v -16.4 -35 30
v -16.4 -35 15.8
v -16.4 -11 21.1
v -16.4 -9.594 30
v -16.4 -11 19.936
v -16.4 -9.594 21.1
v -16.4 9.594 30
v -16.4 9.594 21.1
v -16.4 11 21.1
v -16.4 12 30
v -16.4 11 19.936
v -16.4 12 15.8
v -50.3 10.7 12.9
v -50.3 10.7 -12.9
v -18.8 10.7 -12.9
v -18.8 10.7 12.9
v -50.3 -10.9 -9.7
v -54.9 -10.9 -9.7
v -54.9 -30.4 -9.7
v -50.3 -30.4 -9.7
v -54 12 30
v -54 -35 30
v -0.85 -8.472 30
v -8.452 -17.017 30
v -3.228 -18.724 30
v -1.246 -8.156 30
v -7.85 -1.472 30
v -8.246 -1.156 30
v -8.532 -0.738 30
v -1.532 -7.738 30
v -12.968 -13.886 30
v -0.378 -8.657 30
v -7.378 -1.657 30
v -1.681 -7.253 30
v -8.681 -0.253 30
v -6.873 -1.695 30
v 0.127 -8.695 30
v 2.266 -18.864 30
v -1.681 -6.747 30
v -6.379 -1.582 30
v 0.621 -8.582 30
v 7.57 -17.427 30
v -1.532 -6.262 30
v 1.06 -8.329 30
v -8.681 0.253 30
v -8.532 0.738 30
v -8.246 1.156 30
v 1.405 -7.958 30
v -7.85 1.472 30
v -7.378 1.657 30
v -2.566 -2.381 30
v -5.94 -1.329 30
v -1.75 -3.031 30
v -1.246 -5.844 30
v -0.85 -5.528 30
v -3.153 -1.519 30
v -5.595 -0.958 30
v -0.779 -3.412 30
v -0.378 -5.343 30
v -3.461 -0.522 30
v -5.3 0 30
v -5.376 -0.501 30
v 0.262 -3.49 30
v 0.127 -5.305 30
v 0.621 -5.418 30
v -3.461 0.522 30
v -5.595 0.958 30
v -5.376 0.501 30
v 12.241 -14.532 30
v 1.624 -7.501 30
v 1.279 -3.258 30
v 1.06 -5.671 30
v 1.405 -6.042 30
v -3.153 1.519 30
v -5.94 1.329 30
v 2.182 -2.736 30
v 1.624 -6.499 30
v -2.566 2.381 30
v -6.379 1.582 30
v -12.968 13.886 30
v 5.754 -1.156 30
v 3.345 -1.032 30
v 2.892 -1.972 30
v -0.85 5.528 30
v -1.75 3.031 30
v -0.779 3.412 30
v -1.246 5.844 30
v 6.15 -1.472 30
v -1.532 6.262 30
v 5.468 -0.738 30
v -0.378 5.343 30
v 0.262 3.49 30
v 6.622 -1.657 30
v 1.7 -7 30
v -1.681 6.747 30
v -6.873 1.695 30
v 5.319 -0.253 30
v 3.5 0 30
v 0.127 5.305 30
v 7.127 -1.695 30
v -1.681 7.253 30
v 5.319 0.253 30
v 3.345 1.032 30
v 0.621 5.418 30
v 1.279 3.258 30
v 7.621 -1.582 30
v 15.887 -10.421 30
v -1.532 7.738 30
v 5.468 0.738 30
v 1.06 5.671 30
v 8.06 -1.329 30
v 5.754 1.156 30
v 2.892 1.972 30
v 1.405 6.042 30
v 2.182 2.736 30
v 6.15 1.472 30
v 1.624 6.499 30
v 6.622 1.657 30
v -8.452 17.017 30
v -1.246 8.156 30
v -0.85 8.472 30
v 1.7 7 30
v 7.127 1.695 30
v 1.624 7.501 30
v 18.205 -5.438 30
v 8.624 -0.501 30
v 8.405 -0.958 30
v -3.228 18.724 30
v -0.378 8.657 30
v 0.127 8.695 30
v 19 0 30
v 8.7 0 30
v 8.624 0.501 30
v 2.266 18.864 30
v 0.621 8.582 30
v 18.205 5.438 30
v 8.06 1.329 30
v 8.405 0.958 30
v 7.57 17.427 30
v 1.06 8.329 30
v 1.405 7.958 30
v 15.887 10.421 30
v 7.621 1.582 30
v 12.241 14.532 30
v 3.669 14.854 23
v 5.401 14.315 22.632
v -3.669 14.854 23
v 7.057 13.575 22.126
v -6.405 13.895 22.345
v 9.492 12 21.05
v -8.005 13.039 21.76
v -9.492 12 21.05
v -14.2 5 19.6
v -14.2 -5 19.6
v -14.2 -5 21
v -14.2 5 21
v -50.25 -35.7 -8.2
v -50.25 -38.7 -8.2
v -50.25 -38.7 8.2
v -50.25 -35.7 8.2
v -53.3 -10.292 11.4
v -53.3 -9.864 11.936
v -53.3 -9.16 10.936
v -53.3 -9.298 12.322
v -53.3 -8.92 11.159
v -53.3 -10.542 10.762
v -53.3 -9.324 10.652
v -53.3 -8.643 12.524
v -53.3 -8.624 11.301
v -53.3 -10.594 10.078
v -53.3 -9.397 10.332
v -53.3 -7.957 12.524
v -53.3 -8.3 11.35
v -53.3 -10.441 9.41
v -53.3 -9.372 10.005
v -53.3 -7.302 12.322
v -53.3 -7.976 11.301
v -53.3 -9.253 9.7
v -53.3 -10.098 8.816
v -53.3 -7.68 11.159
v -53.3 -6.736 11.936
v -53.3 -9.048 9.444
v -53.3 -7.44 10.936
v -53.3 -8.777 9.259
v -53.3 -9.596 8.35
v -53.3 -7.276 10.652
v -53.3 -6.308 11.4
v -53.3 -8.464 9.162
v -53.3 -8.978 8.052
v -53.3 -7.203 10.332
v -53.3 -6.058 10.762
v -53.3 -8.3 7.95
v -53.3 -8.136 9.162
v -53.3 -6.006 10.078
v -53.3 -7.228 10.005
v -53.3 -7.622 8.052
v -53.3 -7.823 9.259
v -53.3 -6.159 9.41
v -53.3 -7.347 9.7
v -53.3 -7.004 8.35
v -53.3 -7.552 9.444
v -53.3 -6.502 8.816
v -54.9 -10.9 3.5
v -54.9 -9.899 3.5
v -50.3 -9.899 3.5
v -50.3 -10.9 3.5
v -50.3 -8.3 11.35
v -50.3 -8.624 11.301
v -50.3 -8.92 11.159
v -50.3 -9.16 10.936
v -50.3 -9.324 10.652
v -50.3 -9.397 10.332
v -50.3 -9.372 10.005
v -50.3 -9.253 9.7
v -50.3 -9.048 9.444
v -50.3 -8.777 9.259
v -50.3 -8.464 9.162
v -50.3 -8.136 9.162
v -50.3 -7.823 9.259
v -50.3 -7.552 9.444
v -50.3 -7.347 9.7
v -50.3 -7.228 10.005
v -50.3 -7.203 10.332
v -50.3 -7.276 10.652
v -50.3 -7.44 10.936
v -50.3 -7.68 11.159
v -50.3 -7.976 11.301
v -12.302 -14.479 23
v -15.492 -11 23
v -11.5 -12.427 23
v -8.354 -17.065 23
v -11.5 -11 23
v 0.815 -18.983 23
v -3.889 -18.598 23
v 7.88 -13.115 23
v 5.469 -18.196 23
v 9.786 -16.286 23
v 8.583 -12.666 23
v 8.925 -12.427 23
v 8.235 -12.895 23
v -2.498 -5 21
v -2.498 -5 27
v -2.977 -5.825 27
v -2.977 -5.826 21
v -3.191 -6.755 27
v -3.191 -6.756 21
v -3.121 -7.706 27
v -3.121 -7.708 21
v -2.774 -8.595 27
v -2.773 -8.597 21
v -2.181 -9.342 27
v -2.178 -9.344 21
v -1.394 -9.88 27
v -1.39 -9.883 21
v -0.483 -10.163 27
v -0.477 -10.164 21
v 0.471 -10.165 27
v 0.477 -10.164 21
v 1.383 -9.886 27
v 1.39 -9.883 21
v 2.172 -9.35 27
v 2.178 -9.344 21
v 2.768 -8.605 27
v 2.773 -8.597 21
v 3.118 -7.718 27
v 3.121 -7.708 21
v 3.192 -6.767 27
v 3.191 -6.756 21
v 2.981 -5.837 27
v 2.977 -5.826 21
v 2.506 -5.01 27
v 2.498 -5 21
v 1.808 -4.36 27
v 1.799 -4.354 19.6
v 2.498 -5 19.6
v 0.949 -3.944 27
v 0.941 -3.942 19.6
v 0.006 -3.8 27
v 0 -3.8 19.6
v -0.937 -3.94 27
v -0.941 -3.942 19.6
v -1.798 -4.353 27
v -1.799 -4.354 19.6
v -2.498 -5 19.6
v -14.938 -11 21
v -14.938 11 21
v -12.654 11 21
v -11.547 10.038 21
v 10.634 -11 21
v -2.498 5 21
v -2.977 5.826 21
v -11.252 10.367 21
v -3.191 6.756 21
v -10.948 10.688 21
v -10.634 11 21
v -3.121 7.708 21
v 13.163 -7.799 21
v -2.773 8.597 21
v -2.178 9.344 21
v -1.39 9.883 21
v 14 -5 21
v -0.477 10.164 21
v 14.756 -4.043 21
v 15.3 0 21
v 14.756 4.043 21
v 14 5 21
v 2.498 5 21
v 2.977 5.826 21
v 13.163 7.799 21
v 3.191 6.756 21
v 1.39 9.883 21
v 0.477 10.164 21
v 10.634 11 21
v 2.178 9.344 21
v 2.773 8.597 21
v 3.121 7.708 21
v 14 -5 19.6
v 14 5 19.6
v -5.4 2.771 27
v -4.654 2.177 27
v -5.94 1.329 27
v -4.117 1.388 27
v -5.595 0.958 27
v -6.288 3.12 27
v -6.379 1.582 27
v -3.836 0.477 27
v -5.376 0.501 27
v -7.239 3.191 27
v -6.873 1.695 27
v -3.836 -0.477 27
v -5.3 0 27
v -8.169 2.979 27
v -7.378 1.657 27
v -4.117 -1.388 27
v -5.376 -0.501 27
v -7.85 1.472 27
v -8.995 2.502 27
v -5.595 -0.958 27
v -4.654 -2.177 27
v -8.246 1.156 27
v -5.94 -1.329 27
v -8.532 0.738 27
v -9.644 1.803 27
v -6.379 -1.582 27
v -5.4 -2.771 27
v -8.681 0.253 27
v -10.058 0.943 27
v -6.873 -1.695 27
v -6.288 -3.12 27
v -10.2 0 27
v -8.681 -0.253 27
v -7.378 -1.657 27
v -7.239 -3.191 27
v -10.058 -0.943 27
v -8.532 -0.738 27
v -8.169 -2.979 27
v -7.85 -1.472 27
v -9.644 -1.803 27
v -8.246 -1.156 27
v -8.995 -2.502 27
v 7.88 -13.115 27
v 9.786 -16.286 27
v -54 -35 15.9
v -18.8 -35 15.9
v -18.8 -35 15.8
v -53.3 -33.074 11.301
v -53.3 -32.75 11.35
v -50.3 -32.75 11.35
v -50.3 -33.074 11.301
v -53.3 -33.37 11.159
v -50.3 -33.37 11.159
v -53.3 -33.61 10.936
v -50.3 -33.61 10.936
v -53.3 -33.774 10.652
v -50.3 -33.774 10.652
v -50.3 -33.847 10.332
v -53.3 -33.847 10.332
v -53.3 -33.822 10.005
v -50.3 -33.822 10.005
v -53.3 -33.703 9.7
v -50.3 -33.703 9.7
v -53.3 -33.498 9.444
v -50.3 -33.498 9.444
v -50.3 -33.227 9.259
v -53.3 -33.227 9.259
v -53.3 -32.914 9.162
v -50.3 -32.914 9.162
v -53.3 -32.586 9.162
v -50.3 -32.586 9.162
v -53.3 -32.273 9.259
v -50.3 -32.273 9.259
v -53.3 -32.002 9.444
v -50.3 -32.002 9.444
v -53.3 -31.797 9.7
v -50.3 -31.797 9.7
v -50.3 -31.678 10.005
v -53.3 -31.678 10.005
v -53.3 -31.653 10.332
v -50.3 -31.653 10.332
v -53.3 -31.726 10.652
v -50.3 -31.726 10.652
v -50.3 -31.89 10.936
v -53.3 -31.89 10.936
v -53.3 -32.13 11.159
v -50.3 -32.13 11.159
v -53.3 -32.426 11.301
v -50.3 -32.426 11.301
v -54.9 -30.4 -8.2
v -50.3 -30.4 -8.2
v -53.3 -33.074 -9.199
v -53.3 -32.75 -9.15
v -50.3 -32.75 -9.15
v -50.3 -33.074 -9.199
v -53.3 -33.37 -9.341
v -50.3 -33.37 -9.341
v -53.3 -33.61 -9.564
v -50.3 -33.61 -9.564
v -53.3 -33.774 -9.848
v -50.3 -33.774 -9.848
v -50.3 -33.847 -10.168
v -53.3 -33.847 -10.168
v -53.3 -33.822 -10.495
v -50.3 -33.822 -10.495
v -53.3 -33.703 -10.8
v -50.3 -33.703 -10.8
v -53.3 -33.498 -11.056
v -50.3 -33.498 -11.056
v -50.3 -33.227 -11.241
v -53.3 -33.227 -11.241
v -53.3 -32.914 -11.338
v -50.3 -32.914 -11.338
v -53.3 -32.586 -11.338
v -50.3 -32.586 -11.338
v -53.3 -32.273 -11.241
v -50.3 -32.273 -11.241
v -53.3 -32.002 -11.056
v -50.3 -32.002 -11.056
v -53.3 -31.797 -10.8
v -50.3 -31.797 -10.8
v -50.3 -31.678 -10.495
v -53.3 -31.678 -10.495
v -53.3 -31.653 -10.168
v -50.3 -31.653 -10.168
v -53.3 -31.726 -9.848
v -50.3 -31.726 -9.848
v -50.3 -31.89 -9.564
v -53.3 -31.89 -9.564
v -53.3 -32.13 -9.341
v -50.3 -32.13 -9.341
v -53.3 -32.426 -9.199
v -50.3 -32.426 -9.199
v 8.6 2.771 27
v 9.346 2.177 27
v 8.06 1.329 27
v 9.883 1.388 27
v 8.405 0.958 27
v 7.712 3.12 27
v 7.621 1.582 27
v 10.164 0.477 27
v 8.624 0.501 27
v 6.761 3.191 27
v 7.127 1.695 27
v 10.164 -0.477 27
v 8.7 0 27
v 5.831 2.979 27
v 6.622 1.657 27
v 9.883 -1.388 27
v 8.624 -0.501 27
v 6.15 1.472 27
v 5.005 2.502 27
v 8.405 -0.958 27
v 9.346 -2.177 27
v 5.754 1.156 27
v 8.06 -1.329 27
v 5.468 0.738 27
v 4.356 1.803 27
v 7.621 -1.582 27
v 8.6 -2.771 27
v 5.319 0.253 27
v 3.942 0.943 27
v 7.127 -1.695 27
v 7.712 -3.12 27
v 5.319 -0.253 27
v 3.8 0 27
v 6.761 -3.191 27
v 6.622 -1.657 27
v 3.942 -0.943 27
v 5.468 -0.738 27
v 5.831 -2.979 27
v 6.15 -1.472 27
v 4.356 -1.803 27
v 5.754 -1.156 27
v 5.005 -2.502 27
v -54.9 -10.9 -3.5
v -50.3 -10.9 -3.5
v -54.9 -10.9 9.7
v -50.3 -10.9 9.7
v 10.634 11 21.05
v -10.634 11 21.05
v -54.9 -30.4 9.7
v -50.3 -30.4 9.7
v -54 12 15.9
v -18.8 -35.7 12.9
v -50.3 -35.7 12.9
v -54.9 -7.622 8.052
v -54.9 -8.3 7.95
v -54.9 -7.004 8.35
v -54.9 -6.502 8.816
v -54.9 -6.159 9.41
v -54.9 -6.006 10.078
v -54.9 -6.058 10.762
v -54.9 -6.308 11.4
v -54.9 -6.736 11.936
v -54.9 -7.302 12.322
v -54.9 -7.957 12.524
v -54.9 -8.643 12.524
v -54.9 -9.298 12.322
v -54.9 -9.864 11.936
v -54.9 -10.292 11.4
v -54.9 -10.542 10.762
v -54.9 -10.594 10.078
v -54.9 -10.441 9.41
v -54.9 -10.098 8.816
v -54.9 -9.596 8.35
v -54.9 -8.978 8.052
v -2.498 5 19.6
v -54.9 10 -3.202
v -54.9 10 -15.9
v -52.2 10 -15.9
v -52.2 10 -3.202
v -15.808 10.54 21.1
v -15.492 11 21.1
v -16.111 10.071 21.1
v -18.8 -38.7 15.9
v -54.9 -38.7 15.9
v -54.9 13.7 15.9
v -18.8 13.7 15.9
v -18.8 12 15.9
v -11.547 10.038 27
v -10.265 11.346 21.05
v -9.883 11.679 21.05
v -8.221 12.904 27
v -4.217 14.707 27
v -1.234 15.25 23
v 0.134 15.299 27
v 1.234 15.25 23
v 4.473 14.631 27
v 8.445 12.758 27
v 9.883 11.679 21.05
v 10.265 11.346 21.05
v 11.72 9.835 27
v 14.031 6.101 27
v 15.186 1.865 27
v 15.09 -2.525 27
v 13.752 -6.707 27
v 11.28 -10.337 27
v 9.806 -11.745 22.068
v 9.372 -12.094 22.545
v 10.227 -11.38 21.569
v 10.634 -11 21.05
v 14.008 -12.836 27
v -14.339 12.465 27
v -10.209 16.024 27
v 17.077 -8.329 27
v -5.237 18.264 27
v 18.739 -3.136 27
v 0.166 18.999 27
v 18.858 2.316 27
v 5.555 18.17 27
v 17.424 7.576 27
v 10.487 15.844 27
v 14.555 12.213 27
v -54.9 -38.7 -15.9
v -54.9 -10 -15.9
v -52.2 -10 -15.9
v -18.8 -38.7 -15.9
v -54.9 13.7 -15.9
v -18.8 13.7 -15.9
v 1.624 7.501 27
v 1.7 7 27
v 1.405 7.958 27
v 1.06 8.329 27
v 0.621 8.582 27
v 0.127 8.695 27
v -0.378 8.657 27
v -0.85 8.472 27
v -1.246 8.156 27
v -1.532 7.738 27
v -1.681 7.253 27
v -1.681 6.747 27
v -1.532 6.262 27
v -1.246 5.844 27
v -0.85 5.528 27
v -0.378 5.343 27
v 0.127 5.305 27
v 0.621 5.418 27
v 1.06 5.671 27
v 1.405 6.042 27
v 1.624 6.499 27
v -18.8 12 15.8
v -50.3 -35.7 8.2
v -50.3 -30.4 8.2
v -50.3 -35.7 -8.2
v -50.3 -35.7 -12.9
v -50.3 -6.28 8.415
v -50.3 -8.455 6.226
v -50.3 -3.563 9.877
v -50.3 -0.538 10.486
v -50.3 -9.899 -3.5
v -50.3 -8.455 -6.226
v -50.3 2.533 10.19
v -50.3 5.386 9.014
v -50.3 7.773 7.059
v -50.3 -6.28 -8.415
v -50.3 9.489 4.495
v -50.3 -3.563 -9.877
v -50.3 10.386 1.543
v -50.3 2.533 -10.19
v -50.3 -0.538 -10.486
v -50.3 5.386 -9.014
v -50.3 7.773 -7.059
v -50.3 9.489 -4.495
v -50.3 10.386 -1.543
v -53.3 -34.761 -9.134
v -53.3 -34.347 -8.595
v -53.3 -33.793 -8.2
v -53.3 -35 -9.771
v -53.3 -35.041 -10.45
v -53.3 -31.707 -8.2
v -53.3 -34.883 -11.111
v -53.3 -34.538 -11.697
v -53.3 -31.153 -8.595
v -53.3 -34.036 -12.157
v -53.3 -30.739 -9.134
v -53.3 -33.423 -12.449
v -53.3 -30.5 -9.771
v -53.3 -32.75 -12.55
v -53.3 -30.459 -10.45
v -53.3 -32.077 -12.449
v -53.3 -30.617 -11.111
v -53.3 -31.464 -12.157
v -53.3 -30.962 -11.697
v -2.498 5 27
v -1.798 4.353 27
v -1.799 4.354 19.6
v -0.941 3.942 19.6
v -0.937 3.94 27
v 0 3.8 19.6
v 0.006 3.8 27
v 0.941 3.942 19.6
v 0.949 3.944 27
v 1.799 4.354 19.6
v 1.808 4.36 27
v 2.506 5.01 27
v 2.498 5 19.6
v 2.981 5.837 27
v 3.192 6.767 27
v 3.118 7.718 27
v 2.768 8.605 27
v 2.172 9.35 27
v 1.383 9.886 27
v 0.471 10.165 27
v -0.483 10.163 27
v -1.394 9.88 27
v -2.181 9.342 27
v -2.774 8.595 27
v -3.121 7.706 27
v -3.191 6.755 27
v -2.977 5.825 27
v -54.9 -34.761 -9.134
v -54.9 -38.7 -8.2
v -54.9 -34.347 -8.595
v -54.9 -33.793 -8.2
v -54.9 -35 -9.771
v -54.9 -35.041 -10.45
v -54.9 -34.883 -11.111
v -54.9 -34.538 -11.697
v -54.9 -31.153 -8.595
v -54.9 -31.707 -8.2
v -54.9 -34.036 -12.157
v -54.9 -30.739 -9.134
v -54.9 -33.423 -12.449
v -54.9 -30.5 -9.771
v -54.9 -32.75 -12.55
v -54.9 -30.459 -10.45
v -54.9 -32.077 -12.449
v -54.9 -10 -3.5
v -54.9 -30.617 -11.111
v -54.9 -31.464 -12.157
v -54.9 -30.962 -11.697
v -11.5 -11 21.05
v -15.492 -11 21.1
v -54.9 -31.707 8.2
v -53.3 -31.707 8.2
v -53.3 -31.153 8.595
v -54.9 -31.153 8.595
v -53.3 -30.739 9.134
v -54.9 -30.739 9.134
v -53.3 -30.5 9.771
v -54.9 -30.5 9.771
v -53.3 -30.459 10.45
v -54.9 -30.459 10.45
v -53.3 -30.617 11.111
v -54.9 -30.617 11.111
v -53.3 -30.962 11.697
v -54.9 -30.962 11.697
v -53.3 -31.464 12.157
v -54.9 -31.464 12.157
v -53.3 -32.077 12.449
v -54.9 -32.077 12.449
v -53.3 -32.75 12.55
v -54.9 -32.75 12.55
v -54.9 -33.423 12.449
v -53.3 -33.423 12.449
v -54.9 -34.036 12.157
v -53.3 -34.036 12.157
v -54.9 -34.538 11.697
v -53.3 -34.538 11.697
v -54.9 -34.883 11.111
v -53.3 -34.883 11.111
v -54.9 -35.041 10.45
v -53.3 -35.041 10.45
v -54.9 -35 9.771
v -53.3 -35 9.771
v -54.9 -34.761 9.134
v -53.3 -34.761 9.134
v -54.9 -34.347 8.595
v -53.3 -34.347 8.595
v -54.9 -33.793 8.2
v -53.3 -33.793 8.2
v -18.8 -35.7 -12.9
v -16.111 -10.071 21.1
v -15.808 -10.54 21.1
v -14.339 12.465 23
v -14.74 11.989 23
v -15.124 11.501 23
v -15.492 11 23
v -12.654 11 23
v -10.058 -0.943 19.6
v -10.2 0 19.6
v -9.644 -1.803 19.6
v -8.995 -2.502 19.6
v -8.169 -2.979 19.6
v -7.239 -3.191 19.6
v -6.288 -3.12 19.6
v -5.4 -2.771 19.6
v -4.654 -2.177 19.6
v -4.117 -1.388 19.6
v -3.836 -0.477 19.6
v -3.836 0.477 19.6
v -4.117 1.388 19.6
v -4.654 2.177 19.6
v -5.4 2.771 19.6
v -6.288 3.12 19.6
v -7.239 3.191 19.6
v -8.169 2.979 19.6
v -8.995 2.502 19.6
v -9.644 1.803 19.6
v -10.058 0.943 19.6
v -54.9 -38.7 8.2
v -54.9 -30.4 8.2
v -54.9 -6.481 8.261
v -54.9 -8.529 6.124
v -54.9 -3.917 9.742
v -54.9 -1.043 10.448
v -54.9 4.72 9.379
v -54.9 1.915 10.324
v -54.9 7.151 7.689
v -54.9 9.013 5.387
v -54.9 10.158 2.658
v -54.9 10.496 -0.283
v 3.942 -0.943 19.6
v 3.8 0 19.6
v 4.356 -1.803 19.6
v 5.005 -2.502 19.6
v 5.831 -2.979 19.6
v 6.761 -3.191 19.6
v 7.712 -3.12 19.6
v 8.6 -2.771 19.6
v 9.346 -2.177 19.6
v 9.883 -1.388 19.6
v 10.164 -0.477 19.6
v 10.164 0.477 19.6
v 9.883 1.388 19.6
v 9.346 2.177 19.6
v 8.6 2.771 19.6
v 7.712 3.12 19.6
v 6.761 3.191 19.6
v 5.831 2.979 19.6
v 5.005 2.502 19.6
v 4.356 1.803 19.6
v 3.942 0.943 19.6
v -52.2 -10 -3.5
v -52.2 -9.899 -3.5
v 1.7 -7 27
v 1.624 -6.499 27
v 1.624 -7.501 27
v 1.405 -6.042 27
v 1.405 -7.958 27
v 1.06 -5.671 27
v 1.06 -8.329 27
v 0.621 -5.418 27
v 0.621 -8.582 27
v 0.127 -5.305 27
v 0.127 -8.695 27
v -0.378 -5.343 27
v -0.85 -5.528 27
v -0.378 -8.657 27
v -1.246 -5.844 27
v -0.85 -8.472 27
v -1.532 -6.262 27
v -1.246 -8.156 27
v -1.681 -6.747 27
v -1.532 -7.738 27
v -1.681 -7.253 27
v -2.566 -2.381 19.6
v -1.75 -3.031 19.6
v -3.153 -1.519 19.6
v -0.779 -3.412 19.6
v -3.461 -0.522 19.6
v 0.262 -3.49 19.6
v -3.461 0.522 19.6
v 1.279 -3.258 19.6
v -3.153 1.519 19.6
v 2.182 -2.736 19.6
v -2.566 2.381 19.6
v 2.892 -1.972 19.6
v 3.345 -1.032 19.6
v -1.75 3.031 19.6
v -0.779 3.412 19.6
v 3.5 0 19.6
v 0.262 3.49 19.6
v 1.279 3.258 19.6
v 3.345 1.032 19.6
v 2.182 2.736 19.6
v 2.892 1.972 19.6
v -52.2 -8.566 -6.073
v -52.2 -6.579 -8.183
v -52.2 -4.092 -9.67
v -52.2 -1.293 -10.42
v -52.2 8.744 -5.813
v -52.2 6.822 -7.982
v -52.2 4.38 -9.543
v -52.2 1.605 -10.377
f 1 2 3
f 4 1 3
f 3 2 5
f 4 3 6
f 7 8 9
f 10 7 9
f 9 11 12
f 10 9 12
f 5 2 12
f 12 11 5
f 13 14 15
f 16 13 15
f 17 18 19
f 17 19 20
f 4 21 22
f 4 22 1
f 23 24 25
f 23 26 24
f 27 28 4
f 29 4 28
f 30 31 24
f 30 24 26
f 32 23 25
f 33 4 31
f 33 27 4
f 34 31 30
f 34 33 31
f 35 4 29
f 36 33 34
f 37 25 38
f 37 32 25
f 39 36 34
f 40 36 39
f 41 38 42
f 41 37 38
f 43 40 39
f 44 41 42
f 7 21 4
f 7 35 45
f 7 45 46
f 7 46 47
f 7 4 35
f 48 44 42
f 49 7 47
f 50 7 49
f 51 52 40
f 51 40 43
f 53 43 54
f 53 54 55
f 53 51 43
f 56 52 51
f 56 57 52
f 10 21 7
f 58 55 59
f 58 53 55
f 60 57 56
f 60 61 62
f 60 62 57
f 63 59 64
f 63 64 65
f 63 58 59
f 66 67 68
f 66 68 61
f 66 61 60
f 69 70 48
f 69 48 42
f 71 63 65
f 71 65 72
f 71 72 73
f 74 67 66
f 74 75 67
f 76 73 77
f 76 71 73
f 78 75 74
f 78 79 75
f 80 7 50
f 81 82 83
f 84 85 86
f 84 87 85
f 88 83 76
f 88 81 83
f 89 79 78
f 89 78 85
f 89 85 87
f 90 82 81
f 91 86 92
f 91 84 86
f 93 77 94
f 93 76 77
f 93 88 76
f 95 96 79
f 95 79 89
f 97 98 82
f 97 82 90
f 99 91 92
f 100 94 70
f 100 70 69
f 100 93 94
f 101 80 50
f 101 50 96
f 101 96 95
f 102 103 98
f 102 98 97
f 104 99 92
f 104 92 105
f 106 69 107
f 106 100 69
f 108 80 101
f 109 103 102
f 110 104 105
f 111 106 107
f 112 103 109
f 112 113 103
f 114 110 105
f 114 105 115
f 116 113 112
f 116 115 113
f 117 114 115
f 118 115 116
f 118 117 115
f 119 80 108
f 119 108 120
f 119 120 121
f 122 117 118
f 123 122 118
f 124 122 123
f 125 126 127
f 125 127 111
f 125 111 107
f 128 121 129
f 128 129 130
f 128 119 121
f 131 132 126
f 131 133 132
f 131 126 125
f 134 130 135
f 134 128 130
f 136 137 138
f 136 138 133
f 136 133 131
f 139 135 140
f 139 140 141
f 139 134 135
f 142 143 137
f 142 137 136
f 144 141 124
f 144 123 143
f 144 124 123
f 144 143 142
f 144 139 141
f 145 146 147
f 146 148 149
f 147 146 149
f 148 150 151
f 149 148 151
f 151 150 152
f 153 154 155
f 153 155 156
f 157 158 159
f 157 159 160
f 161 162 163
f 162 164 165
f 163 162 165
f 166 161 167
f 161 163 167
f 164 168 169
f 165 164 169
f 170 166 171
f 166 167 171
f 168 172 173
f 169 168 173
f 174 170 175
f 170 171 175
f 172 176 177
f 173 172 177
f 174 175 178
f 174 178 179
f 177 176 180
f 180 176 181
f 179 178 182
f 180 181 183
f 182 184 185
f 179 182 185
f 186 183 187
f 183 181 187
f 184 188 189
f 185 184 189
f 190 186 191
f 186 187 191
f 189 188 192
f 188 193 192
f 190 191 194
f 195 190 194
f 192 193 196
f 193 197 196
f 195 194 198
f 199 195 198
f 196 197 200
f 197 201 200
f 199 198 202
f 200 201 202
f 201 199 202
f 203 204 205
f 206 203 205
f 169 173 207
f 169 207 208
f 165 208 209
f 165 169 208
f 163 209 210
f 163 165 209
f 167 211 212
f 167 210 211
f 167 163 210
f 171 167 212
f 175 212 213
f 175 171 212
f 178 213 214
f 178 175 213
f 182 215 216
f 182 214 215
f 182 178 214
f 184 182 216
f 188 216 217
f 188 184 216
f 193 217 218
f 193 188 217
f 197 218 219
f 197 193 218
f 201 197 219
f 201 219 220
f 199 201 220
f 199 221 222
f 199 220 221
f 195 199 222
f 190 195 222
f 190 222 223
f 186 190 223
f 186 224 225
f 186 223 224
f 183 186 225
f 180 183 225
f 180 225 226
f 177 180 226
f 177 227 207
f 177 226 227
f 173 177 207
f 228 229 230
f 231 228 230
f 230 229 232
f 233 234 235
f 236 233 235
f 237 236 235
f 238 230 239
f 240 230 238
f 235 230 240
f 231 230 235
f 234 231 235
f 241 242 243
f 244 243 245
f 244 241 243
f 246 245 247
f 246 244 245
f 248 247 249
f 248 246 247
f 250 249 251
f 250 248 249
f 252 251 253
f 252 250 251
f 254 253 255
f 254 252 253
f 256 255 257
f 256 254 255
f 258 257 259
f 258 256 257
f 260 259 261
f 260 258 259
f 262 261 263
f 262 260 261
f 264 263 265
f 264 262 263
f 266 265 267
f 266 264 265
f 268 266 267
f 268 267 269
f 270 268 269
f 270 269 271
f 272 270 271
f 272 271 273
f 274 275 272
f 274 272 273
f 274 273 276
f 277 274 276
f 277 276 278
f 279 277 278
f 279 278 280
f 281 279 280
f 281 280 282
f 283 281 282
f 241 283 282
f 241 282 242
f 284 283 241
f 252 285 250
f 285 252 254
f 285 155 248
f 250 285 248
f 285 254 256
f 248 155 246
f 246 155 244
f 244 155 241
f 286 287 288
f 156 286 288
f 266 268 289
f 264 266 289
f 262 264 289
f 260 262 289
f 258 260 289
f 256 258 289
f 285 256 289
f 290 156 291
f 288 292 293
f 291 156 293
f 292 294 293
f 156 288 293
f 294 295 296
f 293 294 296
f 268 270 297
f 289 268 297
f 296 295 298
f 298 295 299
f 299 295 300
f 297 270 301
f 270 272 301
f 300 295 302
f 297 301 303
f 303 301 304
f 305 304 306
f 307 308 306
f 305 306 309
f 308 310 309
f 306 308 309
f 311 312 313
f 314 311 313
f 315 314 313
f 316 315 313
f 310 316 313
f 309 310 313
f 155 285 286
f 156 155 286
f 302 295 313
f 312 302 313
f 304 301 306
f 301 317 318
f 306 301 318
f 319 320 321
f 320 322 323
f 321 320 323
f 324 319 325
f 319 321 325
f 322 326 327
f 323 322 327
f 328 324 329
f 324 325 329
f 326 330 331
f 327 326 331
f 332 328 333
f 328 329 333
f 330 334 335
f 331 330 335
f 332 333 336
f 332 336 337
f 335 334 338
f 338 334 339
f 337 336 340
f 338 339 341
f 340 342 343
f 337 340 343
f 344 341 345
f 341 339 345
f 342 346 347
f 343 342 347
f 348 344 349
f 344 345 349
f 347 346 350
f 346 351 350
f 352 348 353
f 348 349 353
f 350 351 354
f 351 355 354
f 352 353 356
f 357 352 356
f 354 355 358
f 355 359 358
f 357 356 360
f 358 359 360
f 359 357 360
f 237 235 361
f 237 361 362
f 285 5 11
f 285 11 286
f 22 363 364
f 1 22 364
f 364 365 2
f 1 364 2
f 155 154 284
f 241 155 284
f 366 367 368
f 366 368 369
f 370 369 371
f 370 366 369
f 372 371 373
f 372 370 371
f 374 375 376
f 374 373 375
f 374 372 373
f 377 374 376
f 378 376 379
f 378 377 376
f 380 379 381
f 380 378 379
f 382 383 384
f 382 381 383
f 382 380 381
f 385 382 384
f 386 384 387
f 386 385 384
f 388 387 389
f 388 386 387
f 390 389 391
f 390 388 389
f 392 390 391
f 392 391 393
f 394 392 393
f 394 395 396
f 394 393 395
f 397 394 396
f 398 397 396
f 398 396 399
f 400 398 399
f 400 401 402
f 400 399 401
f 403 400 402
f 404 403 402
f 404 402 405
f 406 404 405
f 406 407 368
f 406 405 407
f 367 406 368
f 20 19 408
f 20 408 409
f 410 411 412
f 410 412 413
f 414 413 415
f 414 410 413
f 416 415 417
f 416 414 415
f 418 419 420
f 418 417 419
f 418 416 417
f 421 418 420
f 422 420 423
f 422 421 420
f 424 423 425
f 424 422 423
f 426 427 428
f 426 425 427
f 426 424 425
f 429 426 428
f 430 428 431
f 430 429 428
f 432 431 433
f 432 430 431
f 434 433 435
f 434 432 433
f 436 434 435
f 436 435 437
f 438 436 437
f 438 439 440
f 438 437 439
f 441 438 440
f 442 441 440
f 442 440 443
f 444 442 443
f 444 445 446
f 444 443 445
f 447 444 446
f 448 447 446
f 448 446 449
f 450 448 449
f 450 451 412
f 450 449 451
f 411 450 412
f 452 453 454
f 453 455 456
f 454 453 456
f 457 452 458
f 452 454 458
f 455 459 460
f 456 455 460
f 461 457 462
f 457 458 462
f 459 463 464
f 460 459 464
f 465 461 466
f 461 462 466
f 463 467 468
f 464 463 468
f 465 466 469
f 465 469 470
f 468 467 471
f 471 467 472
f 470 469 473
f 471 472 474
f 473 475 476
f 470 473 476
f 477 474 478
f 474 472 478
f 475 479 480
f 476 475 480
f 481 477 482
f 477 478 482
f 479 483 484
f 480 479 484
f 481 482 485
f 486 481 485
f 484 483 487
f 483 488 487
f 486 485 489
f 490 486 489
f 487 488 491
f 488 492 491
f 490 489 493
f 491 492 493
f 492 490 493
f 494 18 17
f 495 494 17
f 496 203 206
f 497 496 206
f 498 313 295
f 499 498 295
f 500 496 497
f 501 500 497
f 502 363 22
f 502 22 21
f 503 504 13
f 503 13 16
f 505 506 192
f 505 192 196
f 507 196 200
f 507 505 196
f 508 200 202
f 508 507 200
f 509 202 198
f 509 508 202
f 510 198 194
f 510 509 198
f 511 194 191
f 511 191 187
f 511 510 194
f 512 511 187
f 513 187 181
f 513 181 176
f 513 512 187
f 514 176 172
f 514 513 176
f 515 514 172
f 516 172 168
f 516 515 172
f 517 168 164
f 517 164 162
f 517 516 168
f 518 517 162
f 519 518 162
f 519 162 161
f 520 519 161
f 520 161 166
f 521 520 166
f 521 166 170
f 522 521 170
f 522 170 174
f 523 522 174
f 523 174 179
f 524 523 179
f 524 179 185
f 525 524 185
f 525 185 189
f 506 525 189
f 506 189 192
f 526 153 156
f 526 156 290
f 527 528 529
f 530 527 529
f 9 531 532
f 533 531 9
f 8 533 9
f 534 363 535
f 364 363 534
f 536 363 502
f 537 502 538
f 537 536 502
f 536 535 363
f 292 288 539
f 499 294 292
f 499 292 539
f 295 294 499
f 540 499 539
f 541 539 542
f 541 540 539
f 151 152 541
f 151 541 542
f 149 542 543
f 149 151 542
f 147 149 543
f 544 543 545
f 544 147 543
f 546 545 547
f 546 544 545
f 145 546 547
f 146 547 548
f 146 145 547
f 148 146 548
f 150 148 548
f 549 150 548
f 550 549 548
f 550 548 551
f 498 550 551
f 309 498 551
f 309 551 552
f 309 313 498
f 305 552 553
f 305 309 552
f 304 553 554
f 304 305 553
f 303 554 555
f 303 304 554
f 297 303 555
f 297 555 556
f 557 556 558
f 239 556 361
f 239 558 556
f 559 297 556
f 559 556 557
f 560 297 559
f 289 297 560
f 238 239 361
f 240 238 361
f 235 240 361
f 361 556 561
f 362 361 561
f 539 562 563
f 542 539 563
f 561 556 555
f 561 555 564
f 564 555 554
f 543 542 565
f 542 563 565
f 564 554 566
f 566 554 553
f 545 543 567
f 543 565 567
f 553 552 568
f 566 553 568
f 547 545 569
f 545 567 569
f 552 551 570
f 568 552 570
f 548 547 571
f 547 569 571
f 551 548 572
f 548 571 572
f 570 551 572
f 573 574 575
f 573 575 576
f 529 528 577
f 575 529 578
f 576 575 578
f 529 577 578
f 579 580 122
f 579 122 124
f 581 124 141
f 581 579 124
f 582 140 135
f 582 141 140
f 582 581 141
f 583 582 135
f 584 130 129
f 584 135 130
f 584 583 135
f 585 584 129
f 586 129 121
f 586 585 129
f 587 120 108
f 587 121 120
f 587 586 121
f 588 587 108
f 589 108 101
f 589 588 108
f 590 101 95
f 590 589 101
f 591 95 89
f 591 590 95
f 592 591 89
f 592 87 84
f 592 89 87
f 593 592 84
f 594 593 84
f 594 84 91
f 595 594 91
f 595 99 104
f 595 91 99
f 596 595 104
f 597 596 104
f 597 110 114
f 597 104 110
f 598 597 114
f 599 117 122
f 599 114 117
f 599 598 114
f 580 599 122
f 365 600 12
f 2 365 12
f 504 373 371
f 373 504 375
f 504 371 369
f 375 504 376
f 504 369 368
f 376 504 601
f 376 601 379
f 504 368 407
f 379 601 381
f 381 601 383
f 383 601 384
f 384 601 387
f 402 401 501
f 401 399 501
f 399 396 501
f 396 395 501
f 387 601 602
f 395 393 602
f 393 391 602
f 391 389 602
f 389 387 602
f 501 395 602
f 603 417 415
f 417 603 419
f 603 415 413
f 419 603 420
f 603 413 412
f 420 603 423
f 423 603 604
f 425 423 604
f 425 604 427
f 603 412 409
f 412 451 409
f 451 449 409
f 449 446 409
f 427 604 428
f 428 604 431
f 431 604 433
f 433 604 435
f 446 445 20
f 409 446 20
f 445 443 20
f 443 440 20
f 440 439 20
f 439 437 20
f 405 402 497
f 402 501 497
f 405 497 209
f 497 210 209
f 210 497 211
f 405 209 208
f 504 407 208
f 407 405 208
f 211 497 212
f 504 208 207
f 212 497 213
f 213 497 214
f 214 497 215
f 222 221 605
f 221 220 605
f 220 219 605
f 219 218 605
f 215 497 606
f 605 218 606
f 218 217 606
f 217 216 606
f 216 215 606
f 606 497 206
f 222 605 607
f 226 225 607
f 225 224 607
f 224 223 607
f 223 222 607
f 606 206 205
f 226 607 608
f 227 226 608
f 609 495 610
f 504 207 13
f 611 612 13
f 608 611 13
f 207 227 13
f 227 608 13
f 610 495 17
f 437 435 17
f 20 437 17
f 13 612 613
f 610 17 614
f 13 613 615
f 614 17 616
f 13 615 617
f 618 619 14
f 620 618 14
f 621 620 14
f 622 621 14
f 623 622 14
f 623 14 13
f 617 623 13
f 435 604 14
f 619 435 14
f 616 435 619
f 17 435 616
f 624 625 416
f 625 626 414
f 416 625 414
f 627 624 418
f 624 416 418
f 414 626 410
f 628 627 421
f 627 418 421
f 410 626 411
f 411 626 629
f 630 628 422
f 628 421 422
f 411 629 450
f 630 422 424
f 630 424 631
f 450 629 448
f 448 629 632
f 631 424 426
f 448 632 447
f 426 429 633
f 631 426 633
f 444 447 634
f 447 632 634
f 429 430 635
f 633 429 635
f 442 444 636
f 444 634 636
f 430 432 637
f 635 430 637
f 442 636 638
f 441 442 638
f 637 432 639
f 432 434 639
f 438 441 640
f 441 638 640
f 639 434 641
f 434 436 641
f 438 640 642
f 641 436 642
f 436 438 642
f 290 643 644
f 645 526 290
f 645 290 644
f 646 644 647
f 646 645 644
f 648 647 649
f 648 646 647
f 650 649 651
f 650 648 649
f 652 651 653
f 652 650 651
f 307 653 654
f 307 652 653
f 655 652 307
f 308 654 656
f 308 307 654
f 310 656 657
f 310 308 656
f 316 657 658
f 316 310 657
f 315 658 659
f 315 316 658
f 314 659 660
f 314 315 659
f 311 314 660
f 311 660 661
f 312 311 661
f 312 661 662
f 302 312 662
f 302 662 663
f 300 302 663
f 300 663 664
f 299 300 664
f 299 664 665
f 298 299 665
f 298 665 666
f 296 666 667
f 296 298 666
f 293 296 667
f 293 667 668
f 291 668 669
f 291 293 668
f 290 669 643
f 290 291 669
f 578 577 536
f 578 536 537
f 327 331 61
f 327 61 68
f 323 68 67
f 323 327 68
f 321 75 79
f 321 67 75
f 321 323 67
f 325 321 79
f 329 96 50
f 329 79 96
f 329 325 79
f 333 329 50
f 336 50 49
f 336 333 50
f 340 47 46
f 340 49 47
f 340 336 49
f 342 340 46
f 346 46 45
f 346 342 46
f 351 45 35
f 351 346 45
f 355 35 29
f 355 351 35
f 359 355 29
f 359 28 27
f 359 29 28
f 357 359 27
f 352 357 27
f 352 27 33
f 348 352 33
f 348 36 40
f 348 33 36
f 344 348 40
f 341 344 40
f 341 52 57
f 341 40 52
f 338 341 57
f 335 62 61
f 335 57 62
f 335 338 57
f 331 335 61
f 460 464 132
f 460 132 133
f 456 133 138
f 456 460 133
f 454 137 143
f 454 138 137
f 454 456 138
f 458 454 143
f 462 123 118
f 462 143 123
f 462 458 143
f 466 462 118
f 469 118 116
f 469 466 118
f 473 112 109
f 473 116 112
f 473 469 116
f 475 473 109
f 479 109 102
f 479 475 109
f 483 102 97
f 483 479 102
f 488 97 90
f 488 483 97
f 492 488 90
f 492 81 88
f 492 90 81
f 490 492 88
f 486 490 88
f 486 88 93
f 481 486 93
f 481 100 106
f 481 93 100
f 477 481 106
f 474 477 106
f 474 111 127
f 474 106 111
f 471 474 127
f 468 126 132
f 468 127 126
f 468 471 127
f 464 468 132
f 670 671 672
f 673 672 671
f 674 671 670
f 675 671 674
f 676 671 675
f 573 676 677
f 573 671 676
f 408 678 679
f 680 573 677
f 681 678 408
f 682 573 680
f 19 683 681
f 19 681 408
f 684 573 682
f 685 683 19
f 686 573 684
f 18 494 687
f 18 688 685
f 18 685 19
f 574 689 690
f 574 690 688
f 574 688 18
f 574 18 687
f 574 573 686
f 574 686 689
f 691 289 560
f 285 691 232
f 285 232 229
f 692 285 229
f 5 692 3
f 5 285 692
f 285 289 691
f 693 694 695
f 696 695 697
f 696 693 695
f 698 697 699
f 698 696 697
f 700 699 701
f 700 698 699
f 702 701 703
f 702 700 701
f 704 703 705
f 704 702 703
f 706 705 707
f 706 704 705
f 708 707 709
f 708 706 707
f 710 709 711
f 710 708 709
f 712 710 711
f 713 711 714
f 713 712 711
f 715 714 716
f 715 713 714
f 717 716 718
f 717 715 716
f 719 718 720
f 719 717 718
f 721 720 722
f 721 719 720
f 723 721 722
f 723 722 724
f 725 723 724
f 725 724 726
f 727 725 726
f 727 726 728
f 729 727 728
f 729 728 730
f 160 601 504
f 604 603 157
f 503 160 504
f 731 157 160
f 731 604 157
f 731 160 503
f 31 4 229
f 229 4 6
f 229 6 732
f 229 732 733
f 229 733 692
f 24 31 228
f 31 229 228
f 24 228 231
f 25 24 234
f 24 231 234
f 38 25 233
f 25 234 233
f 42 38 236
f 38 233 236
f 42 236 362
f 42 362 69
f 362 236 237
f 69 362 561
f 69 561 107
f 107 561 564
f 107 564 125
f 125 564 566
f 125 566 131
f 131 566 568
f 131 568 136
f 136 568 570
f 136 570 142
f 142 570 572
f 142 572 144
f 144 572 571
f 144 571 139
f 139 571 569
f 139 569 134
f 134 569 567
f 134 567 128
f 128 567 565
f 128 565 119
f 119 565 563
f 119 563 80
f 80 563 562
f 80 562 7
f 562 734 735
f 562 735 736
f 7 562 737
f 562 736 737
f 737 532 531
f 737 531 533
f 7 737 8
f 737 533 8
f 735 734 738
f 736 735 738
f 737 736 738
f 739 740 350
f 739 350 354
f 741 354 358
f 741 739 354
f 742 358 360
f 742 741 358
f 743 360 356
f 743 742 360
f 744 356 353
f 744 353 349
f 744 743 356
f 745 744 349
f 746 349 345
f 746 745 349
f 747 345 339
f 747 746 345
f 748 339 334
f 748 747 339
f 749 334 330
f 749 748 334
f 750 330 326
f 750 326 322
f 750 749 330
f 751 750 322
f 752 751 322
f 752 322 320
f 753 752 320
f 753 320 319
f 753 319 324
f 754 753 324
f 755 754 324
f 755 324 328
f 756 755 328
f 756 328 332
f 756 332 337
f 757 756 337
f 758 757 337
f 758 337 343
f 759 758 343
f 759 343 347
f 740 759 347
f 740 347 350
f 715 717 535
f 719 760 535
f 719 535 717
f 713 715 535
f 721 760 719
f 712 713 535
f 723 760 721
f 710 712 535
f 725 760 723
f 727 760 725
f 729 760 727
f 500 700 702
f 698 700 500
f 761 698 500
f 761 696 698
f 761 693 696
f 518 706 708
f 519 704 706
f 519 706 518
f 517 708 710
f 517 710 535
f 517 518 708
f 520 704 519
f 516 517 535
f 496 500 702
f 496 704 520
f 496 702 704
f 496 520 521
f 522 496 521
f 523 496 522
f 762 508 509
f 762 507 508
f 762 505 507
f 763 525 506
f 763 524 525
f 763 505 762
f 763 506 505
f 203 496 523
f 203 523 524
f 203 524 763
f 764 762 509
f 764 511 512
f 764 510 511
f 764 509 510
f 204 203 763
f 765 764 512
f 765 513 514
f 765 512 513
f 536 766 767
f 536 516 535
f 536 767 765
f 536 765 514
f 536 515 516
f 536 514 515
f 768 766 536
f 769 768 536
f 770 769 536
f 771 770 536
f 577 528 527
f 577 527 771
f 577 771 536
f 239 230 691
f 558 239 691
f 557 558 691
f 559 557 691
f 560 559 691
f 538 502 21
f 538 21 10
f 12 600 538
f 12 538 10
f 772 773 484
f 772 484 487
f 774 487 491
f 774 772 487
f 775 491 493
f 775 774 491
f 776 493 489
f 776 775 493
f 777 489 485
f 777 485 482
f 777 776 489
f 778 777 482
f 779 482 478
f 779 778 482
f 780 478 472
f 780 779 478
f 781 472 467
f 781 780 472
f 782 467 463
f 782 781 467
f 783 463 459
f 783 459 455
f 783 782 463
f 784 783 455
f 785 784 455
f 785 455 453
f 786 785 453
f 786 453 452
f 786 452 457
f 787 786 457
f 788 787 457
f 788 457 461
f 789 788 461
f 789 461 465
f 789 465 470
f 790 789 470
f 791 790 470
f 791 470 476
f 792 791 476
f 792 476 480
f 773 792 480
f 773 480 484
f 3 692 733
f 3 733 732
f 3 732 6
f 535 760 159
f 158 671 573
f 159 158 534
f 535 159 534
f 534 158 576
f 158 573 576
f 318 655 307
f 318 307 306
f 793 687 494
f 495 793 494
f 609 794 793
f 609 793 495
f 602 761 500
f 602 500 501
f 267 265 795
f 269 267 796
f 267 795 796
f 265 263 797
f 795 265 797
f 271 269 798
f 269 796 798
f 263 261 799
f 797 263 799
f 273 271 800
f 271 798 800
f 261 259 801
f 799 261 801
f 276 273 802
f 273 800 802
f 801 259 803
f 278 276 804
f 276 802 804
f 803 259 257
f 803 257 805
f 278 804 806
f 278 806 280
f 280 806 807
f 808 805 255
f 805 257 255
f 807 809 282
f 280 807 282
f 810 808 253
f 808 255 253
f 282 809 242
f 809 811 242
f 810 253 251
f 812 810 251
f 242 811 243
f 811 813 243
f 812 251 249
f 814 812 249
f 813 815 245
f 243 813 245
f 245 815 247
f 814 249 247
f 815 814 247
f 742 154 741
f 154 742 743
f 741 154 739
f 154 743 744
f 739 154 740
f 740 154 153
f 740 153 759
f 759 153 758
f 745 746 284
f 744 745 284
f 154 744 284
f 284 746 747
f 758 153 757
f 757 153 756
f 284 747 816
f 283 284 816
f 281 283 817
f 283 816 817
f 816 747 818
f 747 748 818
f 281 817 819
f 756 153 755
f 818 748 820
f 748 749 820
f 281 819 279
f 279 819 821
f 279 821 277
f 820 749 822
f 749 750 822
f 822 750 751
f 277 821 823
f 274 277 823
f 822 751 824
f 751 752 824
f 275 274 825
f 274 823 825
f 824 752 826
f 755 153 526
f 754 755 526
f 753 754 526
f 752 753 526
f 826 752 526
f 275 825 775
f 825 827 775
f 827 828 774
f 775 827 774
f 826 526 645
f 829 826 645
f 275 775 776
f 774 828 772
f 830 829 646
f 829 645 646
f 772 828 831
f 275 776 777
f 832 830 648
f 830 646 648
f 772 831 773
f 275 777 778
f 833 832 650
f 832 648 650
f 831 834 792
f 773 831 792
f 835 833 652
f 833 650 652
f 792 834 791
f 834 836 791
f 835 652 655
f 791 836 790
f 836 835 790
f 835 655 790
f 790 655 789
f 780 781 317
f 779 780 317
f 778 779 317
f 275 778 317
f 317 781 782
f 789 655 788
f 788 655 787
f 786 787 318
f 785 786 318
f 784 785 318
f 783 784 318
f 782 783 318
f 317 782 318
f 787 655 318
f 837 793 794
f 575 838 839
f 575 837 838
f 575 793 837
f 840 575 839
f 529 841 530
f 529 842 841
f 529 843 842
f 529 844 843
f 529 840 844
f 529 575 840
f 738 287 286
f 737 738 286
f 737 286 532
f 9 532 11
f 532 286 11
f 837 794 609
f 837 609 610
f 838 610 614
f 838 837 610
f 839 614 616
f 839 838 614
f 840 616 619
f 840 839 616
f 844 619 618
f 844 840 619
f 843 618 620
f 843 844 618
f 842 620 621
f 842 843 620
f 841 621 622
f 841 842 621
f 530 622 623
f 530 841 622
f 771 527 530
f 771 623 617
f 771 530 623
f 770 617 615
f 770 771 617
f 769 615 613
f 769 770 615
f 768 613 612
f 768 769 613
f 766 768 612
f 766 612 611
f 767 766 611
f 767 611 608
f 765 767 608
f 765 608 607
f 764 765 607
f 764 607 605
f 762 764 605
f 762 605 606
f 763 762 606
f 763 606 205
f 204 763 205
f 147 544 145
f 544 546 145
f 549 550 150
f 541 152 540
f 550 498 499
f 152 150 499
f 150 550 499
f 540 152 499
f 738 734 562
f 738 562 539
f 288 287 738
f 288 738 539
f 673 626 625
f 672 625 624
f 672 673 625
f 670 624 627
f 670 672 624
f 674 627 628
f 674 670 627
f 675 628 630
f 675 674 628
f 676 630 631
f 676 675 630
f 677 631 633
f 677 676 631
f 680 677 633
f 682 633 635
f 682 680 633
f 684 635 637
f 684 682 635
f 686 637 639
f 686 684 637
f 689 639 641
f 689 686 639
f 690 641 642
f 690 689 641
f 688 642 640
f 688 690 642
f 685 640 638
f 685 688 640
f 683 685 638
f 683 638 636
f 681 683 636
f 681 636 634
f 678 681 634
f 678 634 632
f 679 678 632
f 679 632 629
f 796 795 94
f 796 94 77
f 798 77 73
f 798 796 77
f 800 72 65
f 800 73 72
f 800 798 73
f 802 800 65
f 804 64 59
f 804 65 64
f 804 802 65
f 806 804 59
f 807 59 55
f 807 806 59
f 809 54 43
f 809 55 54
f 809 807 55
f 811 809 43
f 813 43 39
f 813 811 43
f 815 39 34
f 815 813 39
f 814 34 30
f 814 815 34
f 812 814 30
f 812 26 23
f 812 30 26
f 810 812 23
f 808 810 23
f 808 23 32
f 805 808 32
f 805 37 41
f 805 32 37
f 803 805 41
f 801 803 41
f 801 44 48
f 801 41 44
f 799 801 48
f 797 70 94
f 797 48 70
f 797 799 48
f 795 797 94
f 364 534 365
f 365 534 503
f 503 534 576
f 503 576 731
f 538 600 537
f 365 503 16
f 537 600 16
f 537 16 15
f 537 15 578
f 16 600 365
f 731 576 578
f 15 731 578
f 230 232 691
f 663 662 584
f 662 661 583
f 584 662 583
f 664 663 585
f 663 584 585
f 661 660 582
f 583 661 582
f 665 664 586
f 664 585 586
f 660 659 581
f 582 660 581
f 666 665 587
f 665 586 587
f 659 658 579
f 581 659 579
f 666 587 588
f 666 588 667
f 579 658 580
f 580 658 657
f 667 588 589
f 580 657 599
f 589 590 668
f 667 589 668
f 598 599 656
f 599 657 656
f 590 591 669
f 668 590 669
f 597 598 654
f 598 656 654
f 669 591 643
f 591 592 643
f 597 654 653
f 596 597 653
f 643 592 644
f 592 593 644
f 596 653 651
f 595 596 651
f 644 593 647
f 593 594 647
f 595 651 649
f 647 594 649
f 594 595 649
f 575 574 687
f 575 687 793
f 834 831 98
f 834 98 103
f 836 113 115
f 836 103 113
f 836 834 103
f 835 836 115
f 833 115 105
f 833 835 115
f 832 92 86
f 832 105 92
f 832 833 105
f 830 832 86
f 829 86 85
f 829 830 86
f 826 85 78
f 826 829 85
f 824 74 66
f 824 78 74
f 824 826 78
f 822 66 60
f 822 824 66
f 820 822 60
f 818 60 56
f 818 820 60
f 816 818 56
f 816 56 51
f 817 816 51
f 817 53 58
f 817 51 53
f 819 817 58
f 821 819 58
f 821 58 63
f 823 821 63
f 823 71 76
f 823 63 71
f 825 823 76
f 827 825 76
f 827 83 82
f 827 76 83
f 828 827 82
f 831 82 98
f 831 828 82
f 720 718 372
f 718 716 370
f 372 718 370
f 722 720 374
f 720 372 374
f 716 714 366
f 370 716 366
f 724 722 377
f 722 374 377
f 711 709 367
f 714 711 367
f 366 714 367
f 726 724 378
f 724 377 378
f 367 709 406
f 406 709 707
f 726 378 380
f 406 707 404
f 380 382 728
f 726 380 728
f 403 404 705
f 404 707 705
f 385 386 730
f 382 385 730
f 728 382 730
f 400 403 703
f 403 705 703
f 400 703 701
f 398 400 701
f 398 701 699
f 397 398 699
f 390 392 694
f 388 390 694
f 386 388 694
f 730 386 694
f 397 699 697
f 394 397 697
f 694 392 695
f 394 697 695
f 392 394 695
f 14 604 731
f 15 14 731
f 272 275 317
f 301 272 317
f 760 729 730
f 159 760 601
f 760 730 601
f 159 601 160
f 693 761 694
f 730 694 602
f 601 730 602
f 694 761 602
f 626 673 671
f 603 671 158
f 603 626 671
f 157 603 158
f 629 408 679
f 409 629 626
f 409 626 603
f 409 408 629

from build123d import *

# Parameters (mm, degrees)
S_CYL1_R        = 19
BOSS_1_DEPTH    = 7
BOSS_2_DEPTH    = 2.1
S_BOX3_W        = 28.2
S_BOX3_H        = 10
BOSS_3_DEPTH    = 1.5
S_BOX4_W        = 37.6
S_BOX4_H        = 47
BOSS_4_DEPTH    = 14.2
BOSS_5_DEPTH    = 23
BOSS_6_DEPTH    = 22
S_BOX7_W        = 36.1
S_BOX7_H        = 3
BOSS_7_DEPTH    = 31.8
S_BOX8_W        = 36.1
S_BOX8_H        = 3
BOSS_8_DEPTH    = 31.8
S_BOX9_W        = 36.1
S_BOX9_H        = 52.4
BOSS_9_DEPTH    = 3
S_BOX10_W       = 36.1
S_BOX10_H       = 52.4
BOSS_10_DEPTH   = 3
S_BOX11_W       = 4.6
S_BOX11_H       = 52.4
BOSS_11_DEPTH   = 31.8
S_HOLE12_R      = 10.5
HOLE_12_DEPTH   = 4.8
S_CUT13_W       = 4.75
S_CUT13_H       = 19.5
POCKET_13_DEPTH = 19.4
S_CUT14_W       = 4.75
S_CUT14_H       = 8.8
POCKET_14_DEPTH = 16.4
S_CUT15_W       = 4.75
S_CUT15_H       = 11
POCKET_15_DEPTH = 7
S_CUT16_W       = 2.9
S_CUT16_H       = 20
POCKET_16_DEPTH = 16.4
S_HOLE17_R      = 1.1
HOLE_17_DEPTH   = 4.8
S_HOLE18_R      = 2.3
HOLE_18_DEPTH   = 1.7
S_HOLE19_R      = 1.1
HOLE_19_DEPTH   = 4.8
S_HOLE20_R      = 2.3
HOLE_20_DEPTH   = 1.7
S_HOLE21_R      = 1.1
HOLE_21_DEPTH   = 4.8
S_HOLE22_R      = 2.3
HOLE_22_DEPTH   = 1.7
CUT_23_DEPTH    = 6.1
S_HOLE24_R      = 3.5
HOLE_24_DEPTH   = 10.6
S_HOLE25_R      = 1.7
HOLE_25_DEPTH   = 10.6
S_HOLE26_R      = 1.7
HOLE_26_DEPTH   = 10.6
S_HOLE27_R      = 1.7
HOLE_27_DEPTH   = 10.6
S_HOLE28_R      = 1.7
HOLE_28_DEPTH   = 10.6
S_HOLE29_R      = 3.2
HOLE_29_DEPTH   = 7.6
S_HOLE30_R      = 3.2
HOLE_30_DEPTH   = 7.6
S_HOLE31_R      = 3.2
HOLE_31_DEPTH   = 7.6
S_HOLE32_R      = 3.2
HOLE_32_DEPTH   = 7.6


with BuildPart() as part:
    # S_cyl1 → Boss_1 (new body)
    with BuildSketch(Plane.XY.offset(23)):
        Circle(S_CYL1_R)
    extrude(amount=BOSS_1_DEPTH)

    # S_prism2 → Boss_2 (add)
    with BuildSketch(Plane.XY.offset(21)):
        with BuildLine():
            Line((-15.491933385, -11), (15.491933385, -11))
            ThreePointArc((15.491933385, -11), (19, 0), (15.491933385, 11))
            Line((15.491933385, 11), (-15.491933385, 11))
            ThreePointArc((-15.491933385, 11), (-19, 0), (-15.491933385, -11))
        make_face()
    extrude(amount=BOSS_2_DEPTH)

    # S_box3 → Boss_3 (add)
    with BuildSketch(Plane.XY.offset(19.6)):
        with Locations((-0.1, 0)):
            Rectangle(S_BOX3_W, S_BOX3_H)
    extrude(amount=BOSS_3_DEPTH)

    # S_box4 → Boss_4 (add)
    with BuildSketch(Plane.XY.offset(15.8)):
        with Locations((-35.2, -11.5)):
            Rectangle(S_BOX4_W, S_BOX4_H)
    extrude(amount=BOSS_4_DEPTH)

    # S_prism5 → Boss_5 (add)
    with BuildSketch(Plane(origin=(-11.5, 0, 0), x_dir=(0, 0, -1), z_dir=(1, 0, 0))):
        Polygon((-21.05, -11), (-21.05, 12), (-23.1, 15), (-23.1, -12.5), align=None)
    extrude(amount=BOSS_5_DEPTH)

    # S_prism6 → Boss_6 (add)
    with BuildSketch(Plane(origin=(0, -11, 0), x_dir=(1, 0, 0), z_dir=(0, 1, 0))):
        Polygon((-16.45, -21.1), (-16.45, -19.9), (-14.8, -21.1), align=None)
    extrude(amount=BOSS_6_DEPTH)

    # S_box8 → Boss_8 (add)
    with BuildSketch(Plane.XY.offset(-15.9)):
        with Locations((-36.85, 12.2)):
            Rectangle(S_BOX8_W, S_BOX8_H)
    extrude(amount=BOSS_8_DEPTH)



with BuildPart() as body_2:
    # S_box7 → Boss_7 (new body)
    with BuildSketch(Plane.XY.offset(-15.9)):
        with Locations((-36.85, -37.2)):
            Rectangle(S_BOX7_W, S_BOX7_H)
    extrude(amount=BOSS_7_DEPTH)


with BuildPart() as part_1:
    add(part.part)

    add(body_2.part)  # Boss_9 merges body 2
    # S_box9 → Boss_9 (add)
    with BuildSketch(Plane.XY.offset(-15.9)):
        with Locations((-36.85, -12.5)):
            Rectangle(S_BOX9_W, S_BOX9_H)
    extrude(amount=BOSS_9_DEPTH)

    # S_box10 → Boss_10 (add)
    with BuildSketch(Plane.XY.offset(12.9)):
        with Locations((-36.85, -12.5)):
            Rectangle(S_BOX10_W, S_BOX10_H)
    extrude(amount=BOSS_10_DEPTH)

    # S_box11 → Boss_11 (add)
    with BuildSketch(Plane.XY.offset(-15.9)):
        with Locations((-52.6, -12.5)):
            Rectangle(S_BOX11_W, S_BOX11_H)
    extrude(amount=BOSS_11_DEPTH)

    # S_hole12 → Hole_12 (cut)
    with BuildSketch(Plane(origin=(-55, 0, 0), x_dir=(0, 0, -1), z_dir=(1, 0, 0))):
        with Locations(Location((0, 0, 0), (0, 0, 180))):
            Circle(S_HOLE12_R)
    extrude(amount=HOLE_12_DEPTH, mode=Mode.SUBTRACT)

    # S_cut13 → Pocket_13 (cut)
    with BuildSketch(Plane.XY.offset(-9.7)):
        with Locations((-52.625, -20.65)):
            Rectangle(S_CUT13_W, S_CUT13_H)
    extrude(amount=POCKET_13_DEPTH, mode=Mode.SUBTRACT)

    # S_cut14 → Pocket_14 (cut)
    with BuildSketch(Plane.XY.offset(-8.2)):
        with Locations((-52.625, -34.8)):
            Rectangle(S_CUT14_W, S_CUT14_H)
    extrude(amount=POCKET_14_DEPTH, mode=Mode.SUBTRACT)

    # S_cut15 → Pocket_15 (cut)
    with BuildSketch(Plane.XY.offset(-3.5)):
        with Locations((-52.625, -5.5)):
            Rectangle(S_CUT15_W, S_CUT15_H)
    extrude(amount=POCKET_15_DEPTH, mode=Mode.SUBTRACT)

    # S_cut16 → Pocket_16 (cut)
    with BuildSketch(Plane.XY.offset(-16.4)):
        with Locations((-53.65, 0)):
            Rectangle(S_CUT16_W, S_CUT16_H)
    extrude(amount=POCKET_16_DEPTH, mode=Mode.SUBTRACT)

    # S_hole17 → Hole_17 (cut)
    with BuildSketch(Plane(origin=(-55, 0, 0), x_dir=(0, 0, -1), z_dir=(1, 0, 0))):
        with Locations(Location((-10.25, -8.3, 0), (0, 0, 180))):
            Circle(S_HOLE17_R)
    extrude(amount=HOLE_17_DEPTH, mode=Mode.SUBTRACT)

    # S_hole18 → Hole_18 (cut)
    with BuildSketch(Plane(origin=(-55, 0, 0), x_dir=(0, 0, -1), z_dir=(1, 0, 0))):
        with Locations((-10.25, -8.3)):
            Circle(S_HOLE18_R)
    extrude(amount=HOLE_18_DEPTH, mode=Mode.SUBTRACT)

    # S_hole19 → Hole_19 (cut)
    with BuildSketch(Plane(origin=(-55, 0, 0), x_dir=(0, 0, -1), z_dir=(1, 0, 0))):
        with Locations(Location((10.25, -32.75, 0), (0, 0, 180))):
            Circle(S_HOLE19_R)
    extrude(amount=HOLE_19_DEPTH, mode=Mode.SUBTRACT)

    # S_hole20 → Hole_20 (cut)
    with BuildSketch(Plane(origin=(-55, 0, 0), x_dir=(0, 0, -1), z_dir=(1, 0, 0))):
        with Locations((10.25, -32.75)):
            Circle(S_HOLE20_R)
    extrude(amount=HOLE_20_DEPTH, mode=Mode.SUBTRACT)

    # S_hole21 → Hole_21 (cut)
    with BuildSketch(Plane(origin=(-55, 0, 0), x_dir=(0, 0, -1), z_dir=(1, 0, 0))):
        with Locations(Location((-10.25, -32.75, 0), (0, 0, 180))):
            Circle(S_HOLE21_R)
    extrude(amount=HOLE_21_DEPTH, mode=Mode.SUBTRACT)

    # S_hole22 → Hole_22 (cut)
    with BuildSketch(Plane(origin=(-55, 0, 0), x_dir=(0, 0, -1), z_dir=(1, 0, 0))):
        with Locations((-10.25, -32.75)):
            Circle(S_HOLE22_R)
    extrude(amount=HOLE_22_DEPTH, mode=Mode.SUBTRACT)

    # S_pcut23 → Cut_23 (cut)
    with BuildSketch(Plane.XY.offset(20.9)):
        with BuildLine():
            Line((-14.792307772, 12.858756968), (-11.547056577, 10.037703144))
            ThreePointArc((-11.547056577, 10.037703144), (11.72047998, 9.834650428), (7.880082546, -13.114659701))
            Line((7.880082546, -13.114659701), (10.094746268, -16.800479094))
            ThreePointArc((10.094746268, -16.800479094), (15.014471085, 12.59863715), (-14.792307772, 12.858756968))
        make_face()
    extrude(amount=CUT_23_DEPTH, mode=Mode.SUBTRACT)

    # S_hole24 → Hole_24 (cut)
    with BuildSketch(Plane.XY.offset(19.5)):
        Circle(S_HOLE24_R)
    extrude(amount=HOLE_24_DEPTH, mode=Mode.SUBTRACT)

    # S_hole25 → Hole_25 (cut)
    with BuildSketch(Plane.XY.offset(19.5)):
        with Locations((7, 0)):
            Circle(S_HOLE25_R)
    extrude(amount=HOLE_25_DEPTH, mode=Mode.SUBTRACT)

    # S_hole26 → Hole_26 (cut)
    with BuildSketch(Plane.XY.offset(19.5)):
        with Locations((0, 7)):
            Circle(S_HOLE26_R)
    extrude(amount=HOLE_26_DEPTH, mode=Mode.SUBTRACT)

    # S_hole27 → Hole_27 (cut)
    with BuildSketch(Plane.XY.offset(19.5)):
        with Locations((-7, 0)):
            Circle(S_HOLE27_R)
    extrude(amount=HOLE_27_DEPTH, mode=Mode.SUBTRACT)

    # S_hole28 → Hole_28 (cut)
    with BuildSketch(Plane.XY.offset(19.5)):
        with Locations((0, -7)):
            Circle(S_HOLE28_R)
    extrude(amount=HOLE_28_DEPTH, mode=Mode.SUBTRACT)

    # S_hole29 → Hole_29 (cut)
    with BuildSketch(Plane.XY.offset(19.4)):
        with Locations(Location((7, 0, 0), (0, 0, 180))):
            Circle(S_HOLE29_R)
    extrude(amount=HOLE_29_DEPTH, mode=Mode.SUBTRACT)

    # S_hole30 → Hole_30 (cut)
    with BuildSketch(Plane.XY.offset(19.4)):
        with Locations(Location((0, 7, 0), (0, 0, 218.682187453))):
            Circle(S_HOLE30_R)
    extrude(amount=HOLE_30_DEPTH, mode=Mode.SUBTRACT)

    # S_hole31 → Hole_31 (cut)
    with BuildSketch(Plane.XY.offset(19.4)):
        with Locations(Location((-7, 0, 0), (0, 0, 180))):
            Circle(S_HOLE31_R)
    extrude(amount=HOLE_31_DEPTH, mode=Mode.SUBTRACT)

    # S_hole32 → Hole_32 (cut)
    with BuildSketch(Plane.XY.offset(19.4)):
        with Locations(Location((0, -7, 0), (0, 0, 141.317812547))):
            Circle(S_HOLE32_R)
    extrude(amount=HOLE_32_DEPTH, mode=Mode.SUBTRACT)


solid = part_1.part
